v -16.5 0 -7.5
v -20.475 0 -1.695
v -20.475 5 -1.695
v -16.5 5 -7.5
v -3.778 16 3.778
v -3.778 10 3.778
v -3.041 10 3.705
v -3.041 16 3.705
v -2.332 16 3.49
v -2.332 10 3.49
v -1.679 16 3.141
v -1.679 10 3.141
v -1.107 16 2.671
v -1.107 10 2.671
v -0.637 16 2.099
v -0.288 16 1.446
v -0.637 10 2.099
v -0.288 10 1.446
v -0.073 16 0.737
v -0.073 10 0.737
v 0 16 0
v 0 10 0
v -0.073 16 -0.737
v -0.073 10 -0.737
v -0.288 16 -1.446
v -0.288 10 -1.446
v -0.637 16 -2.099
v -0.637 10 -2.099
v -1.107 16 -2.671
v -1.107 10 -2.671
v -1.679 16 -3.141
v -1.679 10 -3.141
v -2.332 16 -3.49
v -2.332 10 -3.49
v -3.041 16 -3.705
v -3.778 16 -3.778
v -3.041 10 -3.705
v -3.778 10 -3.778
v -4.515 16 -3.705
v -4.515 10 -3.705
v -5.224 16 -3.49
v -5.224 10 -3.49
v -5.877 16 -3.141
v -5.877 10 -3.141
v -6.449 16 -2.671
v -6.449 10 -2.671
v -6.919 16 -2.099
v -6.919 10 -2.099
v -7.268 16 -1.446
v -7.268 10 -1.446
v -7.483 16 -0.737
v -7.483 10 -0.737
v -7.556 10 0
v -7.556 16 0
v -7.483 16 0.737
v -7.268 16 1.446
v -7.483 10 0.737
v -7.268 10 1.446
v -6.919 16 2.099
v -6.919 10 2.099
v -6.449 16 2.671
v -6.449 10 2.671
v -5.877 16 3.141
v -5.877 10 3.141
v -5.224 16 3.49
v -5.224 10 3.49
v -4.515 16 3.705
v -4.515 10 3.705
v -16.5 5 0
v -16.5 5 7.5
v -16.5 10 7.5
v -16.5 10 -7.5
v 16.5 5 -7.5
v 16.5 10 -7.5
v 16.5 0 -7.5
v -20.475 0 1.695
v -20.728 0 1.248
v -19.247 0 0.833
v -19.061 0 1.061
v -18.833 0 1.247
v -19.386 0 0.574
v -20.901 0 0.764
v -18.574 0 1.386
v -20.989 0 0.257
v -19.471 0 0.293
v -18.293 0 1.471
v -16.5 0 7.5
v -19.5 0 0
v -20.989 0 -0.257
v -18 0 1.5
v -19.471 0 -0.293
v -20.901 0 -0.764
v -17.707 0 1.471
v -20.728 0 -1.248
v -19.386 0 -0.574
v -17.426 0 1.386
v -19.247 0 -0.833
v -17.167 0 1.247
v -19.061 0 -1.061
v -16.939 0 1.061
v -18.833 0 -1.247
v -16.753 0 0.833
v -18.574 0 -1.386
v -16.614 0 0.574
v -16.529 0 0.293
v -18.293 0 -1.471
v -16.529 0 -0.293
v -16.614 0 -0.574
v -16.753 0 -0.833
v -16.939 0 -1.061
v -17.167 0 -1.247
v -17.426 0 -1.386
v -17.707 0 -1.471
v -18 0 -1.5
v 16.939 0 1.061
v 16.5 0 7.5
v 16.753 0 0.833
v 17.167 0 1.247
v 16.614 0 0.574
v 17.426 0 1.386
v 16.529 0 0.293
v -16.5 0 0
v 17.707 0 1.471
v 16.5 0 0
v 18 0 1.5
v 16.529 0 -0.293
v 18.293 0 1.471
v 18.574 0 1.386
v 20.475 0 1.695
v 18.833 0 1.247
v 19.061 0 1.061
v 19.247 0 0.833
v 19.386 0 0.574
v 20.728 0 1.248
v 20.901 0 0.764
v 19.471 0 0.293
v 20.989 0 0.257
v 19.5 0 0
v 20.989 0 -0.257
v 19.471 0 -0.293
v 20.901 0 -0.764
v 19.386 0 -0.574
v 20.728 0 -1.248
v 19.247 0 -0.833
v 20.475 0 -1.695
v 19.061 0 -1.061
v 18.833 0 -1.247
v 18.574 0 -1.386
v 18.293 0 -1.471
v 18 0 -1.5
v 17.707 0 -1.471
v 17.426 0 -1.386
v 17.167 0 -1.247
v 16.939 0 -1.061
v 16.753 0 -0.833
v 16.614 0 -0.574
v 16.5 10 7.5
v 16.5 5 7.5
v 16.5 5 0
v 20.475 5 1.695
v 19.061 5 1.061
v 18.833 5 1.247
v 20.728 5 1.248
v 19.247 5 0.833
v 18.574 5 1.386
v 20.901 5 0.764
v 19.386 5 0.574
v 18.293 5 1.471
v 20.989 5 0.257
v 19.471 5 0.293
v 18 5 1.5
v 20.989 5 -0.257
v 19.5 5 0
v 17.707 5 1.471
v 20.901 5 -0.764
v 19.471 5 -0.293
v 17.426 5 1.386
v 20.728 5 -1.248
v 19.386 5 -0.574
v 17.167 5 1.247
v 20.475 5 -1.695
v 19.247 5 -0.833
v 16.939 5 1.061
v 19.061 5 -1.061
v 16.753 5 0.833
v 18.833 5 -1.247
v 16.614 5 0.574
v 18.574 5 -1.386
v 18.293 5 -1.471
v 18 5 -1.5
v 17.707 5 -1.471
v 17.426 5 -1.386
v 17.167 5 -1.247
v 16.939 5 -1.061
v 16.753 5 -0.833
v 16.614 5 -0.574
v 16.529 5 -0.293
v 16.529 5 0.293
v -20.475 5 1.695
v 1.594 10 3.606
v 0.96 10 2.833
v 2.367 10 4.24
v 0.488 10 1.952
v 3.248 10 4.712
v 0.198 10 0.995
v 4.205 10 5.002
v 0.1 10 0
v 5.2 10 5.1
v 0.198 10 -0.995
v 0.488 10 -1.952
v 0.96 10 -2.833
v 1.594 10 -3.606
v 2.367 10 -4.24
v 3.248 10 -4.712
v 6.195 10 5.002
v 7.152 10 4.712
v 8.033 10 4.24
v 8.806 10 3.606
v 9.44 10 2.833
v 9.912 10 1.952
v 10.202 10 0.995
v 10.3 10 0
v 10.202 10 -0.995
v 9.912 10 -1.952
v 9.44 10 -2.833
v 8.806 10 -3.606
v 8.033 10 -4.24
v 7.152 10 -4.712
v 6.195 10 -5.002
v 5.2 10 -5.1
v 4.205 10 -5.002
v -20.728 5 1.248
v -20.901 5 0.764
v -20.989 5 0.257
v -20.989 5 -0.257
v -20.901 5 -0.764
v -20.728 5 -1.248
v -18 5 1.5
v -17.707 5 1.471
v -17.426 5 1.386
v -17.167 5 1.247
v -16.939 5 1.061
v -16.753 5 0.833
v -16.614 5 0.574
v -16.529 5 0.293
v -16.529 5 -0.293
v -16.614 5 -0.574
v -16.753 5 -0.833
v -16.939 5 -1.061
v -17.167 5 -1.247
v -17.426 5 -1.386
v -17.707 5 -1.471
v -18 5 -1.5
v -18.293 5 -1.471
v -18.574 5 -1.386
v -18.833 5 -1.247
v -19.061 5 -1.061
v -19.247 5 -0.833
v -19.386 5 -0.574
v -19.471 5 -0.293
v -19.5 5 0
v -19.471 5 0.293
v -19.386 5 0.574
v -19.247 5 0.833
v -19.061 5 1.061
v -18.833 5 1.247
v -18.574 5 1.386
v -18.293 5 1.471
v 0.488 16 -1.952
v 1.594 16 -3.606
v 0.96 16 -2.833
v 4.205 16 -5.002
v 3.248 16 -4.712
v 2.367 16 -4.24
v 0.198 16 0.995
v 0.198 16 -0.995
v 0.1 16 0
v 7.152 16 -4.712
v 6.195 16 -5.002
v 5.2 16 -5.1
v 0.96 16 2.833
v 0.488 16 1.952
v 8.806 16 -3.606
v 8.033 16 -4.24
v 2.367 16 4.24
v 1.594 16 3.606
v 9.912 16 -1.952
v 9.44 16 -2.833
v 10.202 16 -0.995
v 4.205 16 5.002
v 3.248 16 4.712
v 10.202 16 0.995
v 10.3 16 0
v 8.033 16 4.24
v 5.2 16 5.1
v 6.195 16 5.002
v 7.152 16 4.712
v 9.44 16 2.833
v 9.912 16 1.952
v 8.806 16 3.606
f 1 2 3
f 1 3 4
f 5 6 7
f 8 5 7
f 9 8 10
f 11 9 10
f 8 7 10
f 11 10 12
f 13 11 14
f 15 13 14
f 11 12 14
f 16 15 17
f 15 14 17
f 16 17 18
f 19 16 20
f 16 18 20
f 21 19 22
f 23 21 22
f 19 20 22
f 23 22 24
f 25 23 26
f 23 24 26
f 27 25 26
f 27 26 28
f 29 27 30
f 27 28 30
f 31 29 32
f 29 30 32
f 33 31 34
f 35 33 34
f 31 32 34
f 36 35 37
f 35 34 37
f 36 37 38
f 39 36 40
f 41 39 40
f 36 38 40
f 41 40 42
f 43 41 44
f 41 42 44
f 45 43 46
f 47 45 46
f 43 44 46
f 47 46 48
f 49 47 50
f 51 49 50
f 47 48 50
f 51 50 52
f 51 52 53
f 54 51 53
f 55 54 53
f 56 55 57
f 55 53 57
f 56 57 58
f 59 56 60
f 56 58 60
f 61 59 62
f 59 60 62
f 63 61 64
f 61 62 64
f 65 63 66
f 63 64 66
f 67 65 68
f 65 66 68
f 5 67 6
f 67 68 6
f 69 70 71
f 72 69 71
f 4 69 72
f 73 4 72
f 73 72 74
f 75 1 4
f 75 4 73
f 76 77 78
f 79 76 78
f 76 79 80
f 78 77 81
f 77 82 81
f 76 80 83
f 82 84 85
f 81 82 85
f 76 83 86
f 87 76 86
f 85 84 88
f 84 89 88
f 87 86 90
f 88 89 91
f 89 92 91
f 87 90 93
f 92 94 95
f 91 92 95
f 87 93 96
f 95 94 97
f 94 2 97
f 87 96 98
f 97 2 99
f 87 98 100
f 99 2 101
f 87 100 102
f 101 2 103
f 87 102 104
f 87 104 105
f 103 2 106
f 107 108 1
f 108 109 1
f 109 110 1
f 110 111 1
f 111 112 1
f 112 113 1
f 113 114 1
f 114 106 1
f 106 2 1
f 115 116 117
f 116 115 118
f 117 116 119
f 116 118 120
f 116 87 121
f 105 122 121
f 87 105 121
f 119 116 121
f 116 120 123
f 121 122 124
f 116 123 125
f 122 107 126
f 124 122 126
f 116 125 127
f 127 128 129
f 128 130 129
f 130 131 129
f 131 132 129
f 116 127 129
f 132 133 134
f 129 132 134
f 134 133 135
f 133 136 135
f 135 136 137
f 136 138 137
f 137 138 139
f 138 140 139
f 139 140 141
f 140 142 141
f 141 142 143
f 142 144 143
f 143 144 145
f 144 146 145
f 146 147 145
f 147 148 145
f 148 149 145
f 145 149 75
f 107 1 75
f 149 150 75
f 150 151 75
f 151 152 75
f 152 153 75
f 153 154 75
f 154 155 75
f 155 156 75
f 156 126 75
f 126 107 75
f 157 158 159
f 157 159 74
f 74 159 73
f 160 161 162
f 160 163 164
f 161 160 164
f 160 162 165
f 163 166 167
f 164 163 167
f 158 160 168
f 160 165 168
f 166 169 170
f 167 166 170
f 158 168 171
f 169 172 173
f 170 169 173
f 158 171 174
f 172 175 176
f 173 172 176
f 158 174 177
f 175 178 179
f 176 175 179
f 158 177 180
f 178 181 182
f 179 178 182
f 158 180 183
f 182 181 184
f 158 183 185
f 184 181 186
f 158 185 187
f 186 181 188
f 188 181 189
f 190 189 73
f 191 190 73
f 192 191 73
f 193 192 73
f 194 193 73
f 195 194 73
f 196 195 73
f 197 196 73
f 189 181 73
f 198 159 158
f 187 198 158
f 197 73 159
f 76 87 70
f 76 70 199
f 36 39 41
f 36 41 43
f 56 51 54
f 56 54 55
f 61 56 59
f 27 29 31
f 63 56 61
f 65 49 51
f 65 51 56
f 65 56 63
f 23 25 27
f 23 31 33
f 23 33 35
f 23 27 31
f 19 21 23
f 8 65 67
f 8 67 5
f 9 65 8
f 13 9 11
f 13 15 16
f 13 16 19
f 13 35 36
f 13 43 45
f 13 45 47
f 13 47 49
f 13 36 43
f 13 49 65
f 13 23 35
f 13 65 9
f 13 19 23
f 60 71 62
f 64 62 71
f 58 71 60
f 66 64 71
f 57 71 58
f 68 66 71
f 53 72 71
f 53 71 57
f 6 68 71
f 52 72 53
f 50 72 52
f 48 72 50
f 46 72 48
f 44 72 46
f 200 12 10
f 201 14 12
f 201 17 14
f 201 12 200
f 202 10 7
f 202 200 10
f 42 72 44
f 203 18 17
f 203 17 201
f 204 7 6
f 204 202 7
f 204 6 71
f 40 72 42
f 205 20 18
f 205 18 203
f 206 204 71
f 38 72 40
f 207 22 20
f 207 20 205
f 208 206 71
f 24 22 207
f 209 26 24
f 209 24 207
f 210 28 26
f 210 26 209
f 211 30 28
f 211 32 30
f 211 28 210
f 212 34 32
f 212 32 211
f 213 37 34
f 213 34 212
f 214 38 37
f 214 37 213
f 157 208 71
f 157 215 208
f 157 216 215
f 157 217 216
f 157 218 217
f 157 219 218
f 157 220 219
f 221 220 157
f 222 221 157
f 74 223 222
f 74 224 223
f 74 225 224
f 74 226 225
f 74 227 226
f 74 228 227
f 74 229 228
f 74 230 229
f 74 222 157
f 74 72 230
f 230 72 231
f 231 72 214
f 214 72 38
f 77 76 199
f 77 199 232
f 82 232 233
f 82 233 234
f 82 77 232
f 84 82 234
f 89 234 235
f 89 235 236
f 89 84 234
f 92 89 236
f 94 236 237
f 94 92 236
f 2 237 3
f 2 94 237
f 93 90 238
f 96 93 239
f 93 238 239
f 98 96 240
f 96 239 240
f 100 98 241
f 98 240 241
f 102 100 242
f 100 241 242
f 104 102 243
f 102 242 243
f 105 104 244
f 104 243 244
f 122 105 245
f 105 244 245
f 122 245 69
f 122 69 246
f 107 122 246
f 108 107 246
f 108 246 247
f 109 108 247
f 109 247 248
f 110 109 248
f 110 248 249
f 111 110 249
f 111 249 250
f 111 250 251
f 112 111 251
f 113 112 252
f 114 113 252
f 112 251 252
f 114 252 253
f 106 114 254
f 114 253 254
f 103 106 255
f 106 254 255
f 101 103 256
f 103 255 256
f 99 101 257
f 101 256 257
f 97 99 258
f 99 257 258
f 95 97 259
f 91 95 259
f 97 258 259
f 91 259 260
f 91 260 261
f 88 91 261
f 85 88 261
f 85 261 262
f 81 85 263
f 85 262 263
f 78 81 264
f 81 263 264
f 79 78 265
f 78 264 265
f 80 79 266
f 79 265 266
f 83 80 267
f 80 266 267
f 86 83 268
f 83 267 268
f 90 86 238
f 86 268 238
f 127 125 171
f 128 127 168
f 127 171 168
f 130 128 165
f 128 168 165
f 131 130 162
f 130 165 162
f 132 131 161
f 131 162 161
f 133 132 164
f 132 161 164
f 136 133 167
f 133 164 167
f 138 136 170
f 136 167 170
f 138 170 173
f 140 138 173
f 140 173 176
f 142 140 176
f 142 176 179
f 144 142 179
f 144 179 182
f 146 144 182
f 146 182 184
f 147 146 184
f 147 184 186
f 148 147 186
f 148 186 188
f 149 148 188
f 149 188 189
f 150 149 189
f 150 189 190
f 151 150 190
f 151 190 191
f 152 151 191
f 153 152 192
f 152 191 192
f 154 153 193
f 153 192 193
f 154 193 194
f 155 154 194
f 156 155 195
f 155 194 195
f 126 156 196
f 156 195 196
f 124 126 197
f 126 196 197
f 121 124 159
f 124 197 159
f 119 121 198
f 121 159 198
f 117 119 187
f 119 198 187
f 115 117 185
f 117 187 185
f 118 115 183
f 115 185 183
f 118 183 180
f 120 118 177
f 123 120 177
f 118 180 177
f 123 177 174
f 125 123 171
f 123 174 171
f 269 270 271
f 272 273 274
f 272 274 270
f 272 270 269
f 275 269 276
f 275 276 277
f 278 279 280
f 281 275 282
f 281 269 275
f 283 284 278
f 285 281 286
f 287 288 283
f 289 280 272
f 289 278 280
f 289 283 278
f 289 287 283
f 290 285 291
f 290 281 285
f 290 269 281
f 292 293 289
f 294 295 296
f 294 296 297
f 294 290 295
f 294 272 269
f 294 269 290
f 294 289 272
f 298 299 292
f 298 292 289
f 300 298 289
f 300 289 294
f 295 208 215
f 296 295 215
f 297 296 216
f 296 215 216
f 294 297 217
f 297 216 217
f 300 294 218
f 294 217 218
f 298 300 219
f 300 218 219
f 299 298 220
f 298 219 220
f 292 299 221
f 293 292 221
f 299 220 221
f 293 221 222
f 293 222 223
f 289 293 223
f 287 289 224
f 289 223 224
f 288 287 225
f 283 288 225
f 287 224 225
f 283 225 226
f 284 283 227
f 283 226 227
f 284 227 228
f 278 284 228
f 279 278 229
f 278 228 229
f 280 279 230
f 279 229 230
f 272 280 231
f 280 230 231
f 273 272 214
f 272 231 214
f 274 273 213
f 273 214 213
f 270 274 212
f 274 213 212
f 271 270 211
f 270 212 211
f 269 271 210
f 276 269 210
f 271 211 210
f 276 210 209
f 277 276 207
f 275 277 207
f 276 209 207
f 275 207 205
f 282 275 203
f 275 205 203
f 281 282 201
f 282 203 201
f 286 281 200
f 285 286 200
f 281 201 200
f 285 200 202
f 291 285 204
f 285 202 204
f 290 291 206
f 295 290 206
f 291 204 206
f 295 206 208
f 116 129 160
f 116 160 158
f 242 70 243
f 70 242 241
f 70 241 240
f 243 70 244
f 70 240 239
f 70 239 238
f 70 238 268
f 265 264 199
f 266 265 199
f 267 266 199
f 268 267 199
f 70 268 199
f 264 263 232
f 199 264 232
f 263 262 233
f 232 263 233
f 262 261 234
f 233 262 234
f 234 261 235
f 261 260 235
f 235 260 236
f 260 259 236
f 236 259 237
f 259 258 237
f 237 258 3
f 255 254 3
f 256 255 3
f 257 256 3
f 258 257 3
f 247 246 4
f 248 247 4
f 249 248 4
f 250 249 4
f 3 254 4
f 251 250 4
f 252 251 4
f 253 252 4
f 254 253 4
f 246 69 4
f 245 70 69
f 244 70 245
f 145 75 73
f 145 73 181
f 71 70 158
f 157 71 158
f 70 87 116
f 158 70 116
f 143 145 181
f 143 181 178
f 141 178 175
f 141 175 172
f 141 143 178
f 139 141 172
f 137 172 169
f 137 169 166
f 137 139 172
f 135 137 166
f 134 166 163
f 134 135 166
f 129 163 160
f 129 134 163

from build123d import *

# Parameters (mm, degrees)
BOSS_EXTRUDE11_DEPTH   = 5
BOSS_EXTRUDE11_2_DEPTH = 5
SKETCH1_5_W            = 33
SKETCH1_5_H            = 15
BOSS_EXTRUDE13_DEPTH   = 10
SKETCH2_R              = 1.5
CUT_EXTRUDE1_DEPTH     = 5
SKETCH3_R              = 3.777846651
BOSS_EXTRUDE18_DEPTH   = 6
SKETCH3_5_R            = 5.1
BOSS_EXTRUDE22_DEPTH   = 6


with BuildPart() as part:
    # Sketch1 → Boss-Extrude11 (new body)
    with BuildSketch(Plane(origin=(0, 0, 0), x_dir=(1, 0, 0), z_dir=(0, 1, 0))):
        with BuildLine():
            Line((-16.5, -7.5), (-16.5, 7.5))
            Line((-16.5, 7.5), (-20.475239861, 1.695047972))
            ThreePointArc((-20.475239861, 1.695047972), (-21, 0), (-20.475239861, -1.695047972))
            Line((-20.475239861, -1.695047972), (-16.5, -7.5))
        make_face()
    extrude(amount=BOSS_EXTRUDE11_DEPTH)



with BuildPart() as body_2:
    # Sketch1 → Boss-Extrude11 2 (new body)
    with BuildSketch(Plane(origin=(0, 0, 0), x_dir=(1, 0, 0), z_dir=(0, 1, 0))):
        with BuildLine():
            Line((20.475239861, 1.695047972), (16.5, 7.5))
            Line((16.5, 7.5), (16.5, -7.5))
            Line((16.5, -7.5), (20.475239861, -1.695047972))
            ThreePointArc((20.475239861, -1.695047972), (21, 0), (20.475239861, 1.695047972))
        make_face()
    extrude(amount=BOSS_EXTRUDE11_2_DEPTH)


with BuildPart() as part_1:
    add(part.part)

    add(body_2.part)  # Boss-Extrude13 merges body 2
    # Sketch1<5> → Boss-Extrude13 (add)
    with BuildSketch(Plane(origin=(0, 0, 0), x_dir=(1, 0, 0), z_dir=(0, 1, 0))):
        Rectangle(SKETCH1_5_W, SKETCH1_5_H)
    extrude(amount=BOSS_EXTRUDE13_DEPTH)

    # Sketch2 → Cut-Extrude1 (cut)
    with BuildSketch(Plane(origin=(0, 5, 0), x_dir=(1, 0, 0), z_dir=(0, 1, 0))):
        with Locations((-18, 0)):
            Circle(SKETCH2_R)
        with Locations((18, 0)):
            Circle(SKETCH2_R)
    extrude(amount=-CUT_EXTRUDE1_DEPTH, mode=Mode.SUBTRACT)

    # Sketch3 → Boss-Extrude18 (add)
    with BuildSketch(Plane(origin=(0, 10, 0), x_dir=(1, 0, 0), z_dir=(0, 1, 0))):
        with Locations((-3.777846651, 0)):
            Circle(SKETCH3_R)
    extrude(amount=BOSS_EXTRUDE18_DEPTH)

    # Sketch3<5> → Boss-Extrude22 (add)
    with BuildSketch(Plane(origin=(0, 10, 0), x_dir=(1, 0, 0), z_dir=(0, 1, 0))):
        with Locations((5.2, 0)):
            Circle(SKETCH3_5_R)
    extrude(amount=BOSS_EXTRUDE22_DEPTH)


solid = part_1.part
